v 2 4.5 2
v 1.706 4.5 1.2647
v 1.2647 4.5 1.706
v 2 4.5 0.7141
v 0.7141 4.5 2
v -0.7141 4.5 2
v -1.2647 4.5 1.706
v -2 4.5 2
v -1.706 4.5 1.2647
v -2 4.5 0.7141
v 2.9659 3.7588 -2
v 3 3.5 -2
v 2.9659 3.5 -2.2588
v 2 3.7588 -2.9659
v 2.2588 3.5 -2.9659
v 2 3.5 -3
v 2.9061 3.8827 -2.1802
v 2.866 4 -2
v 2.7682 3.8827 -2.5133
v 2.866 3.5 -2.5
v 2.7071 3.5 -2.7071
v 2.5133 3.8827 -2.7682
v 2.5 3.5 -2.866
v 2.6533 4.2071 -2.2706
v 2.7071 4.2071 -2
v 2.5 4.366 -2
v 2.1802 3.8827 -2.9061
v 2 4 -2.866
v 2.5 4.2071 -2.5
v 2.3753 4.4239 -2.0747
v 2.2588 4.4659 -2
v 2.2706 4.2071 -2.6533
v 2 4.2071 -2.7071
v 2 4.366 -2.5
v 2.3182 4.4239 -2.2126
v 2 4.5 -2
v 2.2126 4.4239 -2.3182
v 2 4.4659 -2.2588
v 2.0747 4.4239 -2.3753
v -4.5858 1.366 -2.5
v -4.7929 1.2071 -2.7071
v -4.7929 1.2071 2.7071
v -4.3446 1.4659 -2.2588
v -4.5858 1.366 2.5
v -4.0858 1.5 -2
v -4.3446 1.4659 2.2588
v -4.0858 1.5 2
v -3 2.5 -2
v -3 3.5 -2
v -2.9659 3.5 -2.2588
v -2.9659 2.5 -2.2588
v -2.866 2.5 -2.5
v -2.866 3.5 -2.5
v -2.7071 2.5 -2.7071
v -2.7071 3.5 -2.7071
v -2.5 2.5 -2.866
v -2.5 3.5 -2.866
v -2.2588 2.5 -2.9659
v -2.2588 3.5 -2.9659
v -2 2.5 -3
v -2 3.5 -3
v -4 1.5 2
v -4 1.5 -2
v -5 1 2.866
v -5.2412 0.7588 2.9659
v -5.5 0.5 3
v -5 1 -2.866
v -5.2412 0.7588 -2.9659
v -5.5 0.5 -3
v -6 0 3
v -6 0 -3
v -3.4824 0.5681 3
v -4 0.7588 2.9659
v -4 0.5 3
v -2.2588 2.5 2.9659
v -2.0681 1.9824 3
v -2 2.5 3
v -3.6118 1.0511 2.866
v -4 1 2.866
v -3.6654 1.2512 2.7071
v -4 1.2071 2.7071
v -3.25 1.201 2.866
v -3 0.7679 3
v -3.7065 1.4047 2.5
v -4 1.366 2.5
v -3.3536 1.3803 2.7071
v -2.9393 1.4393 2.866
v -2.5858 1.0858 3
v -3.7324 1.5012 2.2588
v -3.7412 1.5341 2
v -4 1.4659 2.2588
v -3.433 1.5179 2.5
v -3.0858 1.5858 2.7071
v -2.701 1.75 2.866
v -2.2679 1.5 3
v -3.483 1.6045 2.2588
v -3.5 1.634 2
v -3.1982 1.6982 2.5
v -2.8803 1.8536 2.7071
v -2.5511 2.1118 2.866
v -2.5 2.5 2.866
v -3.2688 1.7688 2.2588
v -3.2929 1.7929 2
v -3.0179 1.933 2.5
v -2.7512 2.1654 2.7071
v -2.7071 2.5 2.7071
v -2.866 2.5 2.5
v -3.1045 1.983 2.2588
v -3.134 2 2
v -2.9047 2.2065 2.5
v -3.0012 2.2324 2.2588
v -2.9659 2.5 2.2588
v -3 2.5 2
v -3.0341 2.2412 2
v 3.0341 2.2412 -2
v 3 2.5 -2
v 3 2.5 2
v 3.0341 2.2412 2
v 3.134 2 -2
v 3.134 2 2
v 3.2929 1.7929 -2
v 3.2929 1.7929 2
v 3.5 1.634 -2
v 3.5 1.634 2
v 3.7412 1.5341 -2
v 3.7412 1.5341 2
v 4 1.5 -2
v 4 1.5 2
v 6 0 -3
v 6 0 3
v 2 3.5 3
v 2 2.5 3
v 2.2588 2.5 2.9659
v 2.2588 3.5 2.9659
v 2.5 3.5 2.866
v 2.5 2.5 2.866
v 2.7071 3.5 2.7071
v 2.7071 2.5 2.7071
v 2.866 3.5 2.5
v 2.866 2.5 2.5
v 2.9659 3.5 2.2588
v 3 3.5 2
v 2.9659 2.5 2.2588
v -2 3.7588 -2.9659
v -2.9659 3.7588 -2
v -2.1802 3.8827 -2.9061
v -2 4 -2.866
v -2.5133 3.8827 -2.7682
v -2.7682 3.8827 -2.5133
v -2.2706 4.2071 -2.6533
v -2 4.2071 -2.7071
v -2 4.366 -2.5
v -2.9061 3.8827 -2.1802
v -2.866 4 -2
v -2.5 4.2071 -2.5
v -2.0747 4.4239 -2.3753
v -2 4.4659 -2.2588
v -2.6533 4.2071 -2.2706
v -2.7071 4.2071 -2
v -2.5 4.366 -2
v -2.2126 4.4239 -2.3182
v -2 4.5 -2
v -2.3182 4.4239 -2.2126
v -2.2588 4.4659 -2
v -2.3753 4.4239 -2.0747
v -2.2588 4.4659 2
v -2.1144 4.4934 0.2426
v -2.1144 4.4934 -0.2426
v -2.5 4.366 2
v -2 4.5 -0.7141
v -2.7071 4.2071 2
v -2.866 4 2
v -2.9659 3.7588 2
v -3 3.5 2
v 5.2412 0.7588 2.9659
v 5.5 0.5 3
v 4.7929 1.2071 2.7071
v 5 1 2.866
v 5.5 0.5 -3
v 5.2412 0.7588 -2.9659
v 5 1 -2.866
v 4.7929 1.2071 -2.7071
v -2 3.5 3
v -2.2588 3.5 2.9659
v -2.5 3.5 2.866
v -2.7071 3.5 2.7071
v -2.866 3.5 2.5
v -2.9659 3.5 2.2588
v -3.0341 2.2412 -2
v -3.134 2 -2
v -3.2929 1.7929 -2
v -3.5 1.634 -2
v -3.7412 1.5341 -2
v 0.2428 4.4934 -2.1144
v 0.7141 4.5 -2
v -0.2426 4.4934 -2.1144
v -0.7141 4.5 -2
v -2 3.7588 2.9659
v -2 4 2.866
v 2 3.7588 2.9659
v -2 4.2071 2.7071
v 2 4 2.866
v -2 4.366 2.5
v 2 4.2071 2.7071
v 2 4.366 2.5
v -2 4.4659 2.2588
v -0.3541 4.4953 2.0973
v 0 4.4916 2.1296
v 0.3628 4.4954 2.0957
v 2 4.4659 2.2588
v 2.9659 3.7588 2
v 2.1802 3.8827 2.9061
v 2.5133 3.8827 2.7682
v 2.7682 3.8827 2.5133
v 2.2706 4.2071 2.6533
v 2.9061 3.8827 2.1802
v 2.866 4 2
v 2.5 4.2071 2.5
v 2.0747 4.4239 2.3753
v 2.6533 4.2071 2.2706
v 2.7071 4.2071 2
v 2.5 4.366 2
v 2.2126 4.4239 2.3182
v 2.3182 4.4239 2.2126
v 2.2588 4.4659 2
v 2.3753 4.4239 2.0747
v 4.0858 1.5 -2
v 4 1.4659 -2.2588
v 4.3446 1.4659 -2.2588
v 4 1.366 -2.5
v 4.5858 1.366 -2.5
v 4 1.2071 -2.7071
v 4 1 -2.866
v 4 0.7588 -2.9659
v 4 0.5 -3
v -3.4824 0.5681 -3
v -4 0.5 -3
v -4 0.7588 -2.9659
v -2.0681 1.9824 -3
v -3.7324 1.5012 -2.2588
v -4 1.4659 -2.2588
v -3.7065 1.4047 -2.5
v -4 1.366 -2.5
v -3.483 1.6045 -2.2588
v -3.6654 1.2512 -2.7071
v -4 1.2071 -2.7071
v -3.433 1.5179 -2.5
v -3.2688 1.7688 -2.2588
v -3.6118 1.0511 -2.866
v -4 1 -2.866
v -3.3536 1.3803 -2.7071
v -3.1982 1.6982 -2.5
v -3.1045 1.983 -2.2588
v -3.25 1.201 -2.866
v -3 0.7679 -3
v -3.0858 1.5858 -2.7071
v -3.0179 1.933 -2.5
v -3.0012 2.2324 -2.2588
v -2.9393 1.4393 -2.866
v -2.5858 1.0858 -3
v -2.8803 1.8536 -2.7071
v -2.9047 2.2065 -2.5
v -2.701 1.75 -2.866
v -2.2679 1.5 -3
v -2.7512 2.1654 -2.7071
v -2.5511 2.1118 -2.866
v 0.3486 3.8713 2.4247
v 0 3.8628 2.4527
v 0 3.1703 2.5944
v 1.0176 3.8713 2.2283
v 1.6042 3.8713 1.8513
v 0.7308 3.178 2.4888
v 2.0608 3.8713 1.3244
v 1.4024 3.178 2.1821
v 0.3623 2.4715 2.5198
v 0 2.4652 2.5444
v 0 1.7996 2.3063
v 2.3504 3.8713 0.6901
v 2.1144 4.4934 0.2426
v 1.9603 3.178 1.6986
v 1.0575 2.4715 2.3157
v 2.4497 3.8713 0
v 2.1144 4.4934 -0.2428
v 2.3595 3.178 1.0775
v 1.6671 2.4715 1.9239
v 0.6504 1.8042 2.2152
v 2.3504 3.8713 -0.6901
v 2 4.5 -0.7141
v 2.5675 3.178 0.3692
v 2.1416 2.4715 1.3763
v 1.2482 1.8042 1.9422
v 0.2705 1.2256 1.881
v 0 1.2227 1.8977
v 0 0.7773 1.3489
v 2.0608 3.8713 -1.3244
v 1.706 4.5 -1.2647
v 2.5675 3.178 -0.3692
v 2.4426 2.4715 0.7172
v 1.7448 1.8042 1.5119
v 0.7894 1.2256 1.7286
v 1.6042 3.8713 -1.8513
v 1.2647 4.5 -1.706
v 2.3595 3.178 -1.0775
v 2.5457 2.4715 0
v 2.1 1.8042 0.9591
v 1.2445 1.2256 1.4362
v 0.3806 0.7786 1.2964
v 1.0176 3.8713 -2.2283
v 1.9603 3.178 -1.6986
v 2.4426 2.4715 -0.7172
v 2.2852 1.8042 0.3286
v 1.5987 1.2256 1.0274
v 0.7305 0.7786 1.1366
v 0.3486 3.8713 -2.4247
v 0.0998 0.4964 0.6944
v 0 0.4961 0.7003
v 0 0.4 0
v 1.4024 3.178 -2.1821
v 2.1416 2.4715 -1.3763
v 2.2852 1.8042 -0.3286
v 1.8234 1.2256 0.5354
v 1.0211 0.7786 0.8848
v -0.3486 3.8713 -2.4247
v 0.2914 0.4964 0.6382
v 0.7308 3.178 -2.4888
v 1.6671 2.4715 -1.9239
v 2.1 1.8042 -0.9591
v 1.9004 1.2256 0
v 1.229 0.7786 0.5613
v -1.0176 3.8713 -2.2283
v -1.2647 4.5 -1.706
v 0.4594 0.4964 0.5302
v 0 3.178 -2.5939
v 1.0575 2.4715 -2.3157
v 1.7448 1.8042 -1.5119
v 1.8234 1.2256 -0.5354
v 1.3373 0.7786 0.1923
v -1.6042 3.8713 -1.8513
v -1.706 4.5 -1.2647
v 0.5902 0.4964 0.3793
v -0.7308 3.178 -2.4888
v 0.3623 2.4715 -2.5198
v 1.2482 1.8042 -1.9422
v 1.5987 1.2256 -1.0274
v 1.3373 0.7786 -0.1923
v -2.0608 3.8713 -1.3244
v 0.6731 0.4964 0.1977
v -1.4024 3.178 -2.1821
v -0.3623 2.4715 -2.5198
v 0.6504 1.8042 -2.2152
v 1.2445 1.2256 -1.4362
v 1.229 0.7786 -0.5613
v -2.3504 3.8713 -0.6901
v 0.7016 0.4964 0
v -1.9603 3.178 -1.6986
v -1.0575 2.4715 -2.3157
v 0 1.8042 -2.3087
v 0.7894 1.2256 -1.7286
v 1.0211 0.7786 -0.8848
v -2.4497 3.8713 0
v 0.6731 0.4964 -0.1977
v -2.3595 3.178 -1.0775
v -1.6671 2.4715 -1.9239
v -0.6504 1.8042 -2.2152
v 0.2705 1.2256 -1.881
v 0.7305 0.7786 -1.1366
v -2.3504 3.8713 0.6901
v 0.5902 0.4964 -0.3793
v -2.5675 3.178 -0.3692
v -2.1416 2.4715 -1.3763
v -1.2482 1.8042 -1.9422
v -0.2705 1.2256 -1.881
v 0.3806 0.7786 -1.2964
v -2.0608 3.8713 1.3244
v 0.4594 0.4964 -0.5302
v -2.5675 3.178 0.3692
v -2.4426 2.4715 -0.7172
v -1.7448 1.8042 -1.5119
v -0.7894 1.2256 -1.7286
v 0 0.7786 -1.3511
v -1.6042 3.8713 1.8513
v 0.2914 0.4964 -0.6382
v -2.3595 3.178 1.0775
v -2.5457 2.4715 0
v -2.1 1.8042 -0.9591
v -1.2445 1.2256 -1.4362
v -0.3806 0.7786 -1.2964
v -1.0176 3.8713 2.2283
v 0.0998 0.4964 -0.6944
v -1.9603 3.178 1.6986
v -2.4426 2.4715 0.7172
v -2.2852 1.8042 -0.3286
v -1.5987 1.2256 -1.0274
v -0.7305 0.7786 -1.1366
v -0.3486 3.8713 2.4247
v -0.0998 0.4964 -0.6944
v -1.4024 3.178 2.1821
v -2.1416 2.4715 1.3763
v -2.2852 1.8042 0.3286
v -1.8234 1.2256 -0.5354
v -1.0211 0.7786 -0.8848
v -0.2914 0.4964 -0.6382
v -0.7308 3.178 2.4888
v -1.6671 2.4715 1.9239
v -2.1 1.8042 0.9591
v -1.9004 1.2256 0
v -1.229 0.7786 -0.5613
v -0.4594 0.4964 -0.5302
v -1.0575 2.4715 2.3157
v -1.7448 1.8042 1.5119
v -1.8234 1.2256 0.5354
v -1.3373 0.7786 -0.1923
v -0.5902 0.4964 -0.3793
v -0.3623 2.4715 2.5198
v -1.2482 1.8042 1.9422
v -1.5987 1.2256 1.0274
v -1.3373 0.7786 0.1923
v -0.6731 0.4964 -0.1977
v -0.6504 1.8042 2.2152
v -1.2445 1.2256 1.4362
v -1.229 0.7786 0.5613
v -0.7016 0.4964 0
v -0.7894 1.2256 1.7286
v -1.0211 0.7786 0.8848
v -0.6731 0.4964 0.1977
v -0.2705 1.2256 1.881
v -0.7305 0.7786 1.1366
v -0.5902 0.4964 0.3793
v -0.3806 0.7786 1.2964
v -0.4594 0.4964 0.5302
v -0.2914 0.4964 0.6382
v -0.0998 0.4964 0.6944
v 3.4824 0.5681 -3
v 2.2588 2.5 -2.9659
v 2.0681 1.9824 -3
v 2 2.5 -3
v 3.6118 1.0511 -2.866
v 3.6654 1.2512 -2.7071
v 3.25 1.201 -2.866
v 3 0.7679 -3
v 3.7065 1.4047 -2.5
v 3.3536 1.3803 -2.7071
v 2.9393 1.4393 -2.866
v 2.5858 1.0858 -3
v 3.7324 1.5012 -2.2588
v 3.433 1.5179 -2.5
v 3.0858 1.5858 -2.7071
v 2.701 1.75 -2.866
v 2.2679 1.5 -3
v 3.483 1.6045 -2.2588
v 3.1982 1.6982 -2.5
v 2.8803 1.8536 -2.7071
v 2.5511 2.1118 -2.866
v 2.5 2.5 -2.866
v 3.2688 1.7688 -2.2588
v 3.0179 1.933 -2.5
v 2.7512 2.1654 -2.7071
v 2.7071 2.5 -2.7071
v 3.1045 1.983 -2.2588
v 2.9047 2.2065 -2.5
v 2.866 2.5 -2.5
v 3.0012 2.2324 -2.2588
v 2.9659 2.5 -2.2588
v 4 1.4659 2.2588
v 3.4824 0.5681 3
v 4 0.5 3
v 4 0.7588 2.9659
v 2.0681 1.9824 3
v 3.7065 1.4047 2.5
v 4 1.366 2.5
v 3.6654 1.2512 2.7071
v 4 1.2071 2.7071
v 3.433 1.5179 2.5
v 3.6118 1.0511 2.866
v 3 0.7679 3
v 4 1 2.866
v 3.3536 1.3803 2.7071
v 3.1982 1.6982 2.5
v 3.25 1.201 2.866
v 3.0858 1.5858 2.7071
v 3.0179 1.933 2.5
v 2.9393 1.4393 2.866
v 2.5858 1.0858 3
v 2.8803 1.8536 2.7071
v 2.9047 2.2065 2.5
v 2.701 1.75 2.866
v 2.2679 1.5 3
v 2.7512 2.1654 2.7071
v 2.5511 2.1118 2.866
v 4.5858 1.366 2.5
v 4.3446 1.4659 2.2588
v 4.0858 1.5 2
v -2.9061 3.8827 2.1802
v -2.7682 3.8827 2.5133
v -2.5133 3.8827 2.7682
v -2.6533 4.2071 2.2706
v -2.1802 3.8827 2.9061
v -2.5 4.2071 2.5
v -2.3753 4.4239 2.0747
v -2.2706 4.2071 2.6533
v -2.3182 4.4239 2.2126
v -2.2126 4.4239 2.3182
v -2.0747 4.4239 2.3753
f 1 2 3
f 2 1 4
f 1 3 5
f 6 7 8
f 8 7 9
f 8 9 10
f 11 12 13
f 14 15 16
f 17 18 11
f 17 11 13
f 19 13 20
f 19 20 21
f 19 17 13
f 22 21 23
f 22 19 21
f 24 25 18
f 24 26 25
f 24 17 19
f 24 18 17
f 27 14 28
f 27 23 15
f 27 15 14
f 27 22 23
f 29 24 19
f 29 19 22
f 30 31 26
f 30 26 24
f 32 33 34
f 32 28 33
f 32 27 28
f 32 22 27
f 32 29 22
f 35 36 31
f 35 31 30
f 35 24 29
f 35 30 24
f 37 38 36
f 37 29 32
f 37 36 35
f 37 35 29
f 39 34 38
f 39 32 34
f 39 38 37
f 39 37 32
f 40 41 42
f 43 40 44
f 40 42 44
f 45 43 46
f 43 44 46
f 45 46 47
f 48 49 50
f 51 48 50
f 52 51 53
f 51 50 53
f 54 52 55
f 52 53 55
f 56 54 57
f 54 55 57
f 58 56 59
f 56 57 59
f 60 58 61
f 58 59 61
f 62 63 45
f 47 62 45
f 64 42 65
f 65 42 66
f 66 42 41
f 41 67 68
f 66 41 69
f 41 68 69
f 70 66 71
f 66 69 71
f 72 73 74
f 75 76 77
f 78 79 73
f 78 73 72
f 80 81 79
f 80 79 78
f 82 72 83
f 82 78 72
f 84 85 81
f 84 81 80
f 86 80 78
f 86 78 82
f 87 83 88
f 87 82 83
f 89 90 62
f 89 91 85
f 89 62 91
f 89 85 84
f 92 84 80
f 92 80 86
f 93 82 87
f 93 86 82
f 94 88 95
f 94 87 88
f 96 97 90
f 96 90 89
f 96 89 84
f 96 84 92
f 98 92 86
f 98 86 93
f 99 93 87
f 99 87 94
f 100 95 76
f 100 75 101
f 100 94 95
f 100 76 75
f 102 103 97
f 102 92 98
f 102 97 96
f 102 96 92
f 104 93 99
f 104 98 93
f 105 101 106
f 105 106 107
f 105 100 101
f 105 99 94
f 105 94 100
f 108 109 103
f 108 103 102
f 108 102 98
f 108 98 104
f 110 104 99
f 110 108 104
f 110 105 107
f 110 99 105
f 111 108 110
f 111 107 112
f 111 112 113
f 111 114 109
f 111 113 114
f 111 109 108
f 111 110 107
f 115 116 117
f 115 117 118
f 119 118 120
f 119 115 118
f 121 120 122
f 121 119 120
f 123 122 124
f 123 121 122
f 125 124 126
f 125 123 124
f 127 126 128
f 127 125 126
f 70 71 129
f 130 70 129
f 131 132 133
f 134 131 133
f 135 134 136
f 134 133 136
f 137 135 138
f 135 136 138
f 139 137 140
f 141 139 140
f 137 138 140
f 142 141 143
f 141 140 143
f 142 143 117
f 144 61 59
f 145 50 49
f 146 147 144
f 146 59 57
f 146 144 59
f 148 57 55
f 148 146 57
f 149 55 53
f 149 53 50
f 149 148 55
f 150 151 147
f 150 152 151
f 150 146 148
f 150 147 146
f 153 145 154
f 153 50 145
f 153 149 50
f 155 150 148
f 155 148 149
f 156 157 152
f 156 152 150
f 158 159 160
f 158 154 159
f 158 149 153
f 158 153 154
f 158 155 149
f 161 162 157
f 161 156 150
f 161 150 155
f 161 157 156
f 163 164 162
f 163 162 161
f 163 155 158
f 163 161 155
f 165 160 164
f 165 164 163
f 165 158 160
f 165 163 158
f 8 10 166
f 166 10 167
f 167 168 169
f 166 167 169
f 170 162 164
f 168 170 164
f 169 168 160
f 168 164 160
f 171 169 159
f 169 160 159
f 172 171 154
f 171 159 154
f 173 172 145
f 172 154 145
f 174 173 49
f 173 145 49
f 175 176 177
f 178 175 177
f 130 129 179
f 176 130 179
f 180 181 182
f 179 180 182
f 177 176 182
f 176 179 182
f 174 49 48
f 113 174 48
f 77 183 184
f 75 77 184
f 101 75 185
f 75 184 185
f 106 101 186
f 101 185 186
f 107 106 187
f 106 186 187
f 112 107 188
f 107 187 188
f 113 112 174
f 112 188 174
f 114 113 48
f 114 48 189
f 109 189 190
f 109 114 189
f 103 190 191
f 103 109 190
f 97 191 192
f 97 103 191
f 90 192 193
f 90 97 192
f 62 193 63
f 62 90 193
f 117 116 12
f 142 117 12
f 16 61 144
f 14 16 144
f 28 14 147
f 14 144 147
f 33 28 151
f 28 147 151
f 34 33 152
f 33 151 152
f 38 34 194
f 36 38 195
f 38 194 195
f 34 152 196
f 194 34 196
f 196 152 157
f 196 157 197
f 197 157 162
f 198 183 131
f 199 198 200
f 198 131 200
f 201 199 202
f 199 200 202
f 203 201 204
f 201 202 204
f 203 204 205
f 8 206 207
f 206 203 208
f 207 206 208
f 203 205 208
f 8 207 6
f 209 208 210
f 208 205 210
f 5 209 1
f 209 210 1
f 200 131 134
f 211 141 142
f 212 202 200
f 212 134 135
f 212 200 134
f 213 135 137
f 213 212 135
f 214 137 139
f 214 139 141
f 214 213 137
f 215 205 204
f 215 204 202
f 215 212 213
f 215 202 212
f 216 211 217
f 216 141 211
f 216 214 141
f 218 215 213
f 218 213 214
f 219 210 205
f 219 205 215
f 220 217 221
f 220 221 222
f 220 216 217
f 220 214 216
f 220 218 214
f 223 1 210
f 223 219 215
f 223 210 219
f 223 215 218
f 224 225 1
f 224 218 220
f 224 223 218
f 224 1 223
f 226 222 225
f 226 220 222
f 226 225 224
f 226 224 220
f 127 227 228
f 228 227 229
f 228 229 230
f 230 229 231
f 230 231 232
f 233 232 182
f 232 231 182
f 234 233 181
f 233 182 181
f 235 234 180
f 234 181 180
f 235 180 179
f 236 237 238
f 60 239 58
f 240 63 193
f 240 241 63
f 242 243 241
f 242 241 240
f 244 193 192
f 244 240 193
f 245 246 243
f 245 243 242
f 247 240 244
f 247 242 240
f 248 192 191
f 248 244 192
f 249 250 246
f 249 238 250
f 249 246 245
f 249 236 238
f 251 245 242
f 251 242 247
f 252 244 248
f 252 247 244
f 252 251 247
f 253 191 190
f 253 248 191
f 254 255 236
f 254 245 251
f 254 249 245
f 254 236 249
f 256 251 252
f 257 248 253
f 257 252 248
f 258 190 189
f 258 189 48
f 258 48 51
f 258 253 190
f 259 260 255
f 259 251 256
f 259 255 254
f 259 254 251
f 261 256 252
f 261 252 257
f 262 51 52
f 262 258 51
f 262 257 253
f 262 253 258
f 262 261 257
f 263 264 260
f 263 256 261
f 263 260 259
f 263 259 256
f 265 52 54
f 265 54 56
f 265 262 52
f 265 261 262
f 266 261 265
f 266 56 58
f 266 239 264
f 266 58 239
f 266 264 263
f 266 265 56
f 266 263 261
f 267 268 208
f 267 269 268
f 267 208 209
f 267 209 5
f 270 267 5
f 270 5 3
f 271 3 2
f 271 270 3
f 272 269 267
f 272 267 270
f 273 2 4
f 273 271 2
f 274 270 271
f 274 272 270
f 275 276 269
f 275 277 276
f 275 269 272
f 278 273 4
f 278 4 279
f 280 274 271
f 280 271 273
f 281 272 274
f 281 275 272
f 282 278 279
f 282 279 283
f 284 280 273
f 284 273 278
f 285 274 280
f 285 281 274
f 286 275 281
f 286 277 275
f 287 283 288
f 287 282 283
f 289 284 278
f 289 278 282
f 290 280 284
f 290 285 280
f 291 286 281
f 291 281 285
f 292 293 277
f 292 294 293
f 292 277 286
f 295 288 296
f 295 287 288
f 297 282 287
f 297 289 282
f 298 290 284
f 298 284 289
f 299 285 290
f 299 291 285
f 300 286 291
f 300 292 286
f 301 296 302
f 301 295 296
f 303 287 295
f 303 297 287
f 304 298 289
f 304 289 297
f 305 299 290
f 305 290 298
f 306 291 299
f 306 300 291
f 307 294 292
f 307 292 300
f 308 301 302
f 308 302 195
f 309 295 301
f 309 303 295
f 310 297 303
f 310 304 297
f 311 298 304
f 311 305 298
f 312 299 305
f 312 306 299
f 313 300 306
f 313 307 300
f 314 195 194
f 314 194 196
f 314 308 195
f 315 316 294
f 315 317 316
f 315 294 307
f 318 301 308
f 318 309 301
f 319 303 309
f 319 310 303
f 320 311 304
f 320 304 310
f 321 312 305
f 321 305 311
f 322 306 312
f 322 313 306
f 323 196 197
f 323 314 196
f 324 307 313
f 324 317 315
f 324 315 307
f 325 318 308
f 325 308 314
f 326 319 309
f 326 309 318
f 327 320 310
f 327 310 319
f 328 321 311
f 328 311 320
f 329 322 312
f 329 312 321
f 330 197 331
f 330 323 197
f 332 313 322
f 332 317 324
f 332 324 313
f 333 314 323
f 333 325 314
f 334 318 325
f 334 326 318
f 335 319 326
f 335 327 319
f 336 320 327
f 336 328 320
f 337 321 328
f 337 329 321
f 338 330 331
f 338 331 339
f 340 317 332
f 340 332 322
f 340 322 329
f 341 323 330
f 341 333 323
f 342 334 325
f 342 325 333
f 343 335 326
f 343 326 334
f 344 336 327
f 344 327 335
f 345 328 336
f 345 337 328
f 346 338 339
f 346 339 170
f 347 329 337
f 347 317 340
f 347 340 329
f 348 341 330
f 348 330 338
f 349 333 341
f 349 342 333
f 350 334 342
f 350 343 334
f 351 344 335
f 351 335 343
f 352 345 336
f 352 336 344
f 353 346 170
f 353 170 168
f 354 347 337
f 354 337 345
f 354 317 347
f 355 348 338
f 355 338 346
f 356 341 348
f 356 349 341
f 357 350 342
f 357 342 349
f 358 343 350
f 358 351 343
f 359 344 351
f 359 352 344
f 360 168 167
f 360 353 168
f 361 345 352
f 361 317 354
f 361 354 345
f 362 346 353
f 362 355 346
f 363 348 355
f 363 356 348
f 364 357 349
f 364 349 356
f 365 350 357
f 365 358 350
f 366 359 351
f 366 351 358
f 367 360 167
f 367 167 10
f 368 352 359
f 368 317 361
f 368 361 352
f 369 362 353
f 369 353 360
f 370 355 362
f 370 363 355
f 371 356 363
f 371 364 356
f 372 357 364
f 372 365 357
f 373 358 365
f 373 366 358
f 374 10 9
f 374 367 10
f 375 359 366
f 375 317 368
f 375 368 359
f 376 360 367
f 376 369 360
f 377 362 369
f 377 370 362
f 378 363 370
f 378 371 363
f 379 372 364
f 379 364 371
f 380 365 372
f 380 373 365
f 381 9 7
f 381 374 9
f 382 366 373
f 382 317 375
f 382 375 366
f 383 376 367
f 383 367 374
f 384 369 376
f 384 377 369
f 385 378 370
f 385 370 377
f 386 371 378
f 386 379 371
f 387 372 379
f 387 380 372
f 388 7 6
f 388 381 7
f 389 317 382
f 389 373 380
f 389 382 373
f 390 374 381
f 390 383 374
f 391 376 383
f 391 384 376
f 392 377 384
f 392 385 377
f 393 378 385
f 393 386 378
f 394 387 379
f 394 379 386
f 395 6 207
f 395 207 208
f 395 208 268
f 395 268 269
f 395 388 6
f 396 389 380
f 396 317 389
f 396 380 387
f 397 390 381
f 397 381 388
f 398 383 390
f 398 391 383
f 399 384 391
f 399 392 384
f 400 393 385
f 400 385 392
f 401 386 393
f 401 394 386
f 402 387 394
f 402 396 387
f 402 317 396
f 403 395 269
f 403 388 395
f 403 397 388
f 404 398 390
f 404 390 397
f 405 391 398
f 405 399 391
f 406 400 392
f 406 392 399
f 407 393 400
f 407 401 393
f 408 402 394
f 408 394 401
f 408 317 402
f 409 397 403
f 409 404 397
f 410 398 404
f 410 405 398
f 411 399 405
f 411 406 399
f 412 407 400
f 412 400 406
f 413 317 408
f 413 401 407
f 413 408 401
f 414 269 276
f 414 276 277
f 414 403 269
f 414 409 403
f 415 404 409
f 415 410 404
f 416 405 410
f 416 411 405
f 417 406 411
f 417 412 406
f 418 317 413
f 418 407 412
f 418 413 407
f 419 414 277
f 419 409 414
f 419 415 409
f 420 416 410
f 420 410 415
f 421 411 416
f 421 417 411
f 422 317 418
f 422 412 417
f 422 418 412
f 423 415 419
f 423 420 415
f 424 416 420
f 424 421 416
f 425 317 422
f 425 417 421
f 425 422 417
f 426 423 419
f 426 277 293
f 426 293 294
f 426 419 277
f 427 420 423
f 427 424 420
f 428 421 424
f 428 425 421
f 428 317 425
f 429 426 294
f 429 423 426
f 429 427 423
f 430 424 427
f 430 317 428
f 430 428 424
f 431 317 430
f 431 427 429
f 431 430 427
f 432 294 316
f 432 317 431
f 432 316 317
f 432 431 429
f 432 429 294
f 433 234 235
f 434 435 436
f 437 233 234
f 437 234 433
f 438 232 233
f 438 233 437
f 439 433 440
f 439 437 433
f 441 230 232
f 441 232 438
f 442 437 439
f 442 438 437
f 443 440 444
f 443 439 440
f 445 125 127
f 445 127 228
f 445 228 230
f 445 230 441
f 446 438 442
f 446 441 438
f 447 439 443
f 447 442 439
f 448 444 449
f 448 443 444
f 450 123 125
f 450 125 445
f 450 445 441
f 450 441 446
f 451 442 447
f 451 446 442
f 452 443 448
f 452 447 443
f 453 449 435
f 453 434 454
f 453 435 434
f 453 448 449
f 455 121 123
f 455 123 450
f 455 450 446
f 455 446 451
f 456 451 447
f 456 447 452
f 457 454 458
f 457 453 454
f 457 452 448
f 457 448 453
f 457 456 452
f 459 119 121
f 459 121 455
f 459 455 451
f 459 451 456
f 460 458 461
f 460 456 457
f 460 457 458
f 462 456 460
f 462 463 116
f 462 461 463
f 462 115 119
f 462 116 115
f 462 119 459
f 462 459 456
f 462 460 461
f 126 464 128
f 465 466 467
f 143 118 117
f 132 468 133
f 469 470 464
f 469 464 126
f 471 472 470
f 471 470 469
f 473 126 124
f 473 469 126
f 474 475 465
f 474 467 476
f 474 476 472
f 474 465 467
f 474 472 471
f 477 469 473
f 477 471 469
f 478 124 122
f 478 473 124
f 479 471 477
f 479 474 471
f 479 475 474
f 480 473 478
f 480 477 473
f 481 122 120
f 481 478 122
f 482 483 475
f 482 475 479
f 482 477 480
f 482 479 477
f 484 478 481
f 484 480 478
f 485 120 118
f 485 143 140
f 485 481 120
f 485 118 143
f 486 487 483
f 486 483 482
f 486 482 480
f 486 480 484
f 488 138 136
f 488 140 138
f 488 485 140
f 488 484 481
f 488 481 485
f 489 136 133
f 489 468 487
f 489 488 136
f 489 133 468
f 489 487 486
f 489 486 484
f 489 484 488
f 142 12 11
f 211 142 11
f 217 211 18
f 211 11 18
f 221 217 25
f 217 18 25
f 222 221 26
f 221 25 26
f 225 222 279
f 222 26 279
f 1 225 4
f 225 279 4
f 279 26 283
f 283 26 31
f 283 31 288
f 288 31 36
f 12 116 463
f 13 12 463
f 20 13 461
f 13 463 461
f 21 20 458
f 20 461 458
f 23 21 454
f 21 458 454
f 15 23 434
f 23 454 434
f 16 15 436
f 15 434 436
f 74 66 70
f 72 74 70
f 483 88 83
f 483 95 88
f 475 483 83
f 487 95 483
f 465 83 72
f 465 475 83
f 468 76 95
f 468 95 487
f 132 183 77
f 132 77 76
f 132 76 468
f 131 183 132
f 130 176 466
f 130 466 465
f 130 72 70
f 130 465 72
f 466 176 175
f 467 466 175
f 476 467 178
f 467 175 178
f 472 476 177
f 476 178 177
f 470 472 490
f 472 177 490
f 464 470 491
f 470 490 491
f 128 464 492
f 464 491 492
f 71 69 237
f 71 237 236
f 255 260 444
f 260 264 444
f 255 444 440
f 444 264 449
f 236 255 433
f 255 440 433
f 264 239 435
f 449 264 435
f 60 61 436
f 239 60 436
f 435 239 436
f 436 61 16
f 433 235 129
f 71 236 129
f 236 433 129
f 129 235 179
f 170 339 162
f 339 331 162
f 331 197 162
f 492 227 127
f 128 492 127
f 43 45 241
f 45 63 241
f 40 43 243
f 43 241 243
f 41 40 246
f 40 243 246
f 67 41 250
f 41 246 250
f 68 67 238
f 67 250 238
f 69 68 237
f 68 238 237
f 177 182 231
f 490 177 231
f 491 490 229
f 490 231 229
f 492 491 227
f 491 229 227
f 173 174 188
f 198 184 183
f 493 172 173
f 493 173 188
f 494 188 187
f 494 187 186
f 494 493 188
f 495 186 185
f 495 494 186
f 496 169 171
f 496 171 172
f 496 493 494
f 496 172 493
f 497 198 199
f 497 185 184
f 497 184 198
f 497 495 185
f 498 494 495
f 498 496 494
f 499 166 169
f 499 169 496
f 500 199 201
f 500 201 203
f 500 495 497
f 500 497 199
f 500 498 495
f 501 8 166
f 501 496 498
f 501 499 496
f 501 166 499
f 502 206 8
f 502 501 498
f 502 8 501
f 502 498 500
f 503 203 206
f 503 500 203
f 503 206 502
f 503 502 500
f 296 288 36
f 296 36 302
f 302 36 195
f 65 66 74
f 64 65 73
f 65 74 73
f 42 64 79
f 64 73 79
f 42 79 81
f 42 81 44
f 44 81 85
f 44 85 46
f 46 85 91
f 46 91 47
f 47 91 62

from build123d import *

# Parameters (mm, degrees)
BOSS_EXTRUDE1_DEPTH      = 3
BOSS_EXTRUDE1_DEPTH_BACK = 3
FILLET1_R                = 1


with BuildPart() as part:
    # Sketch1 → Boss-Extrude1 (new, two sides: drawn at the far end of the back side and taken through both)
    with BuildSketch(Plane.XY.offset(-BOSS_EXTRUDE1_DEPTH_BACK)):
        Polygon((-6, 0), (0, 0), (0, 4.5), (-3, 4.5), (-3, 1.5), (-4.5, 1.5), align=None)
        Polygon((0, 0), (6, 0), (4.5, 1.5), (3, 1.5), (3, 4.5), (0, 4.5), align=None)
    extrude(amount=BOSS_EXTRUDE1_DEPTH + BOSS_EXTRUDE1_DEPTH_BACK)

    # Sketch2 → Cut-Revolve1 (revolve, cut)
    with BuildSketch(Plane(origin=(0, 0, 0), x_dir=(0, 0, -1), z_dir=(1, 0, 0))):
        with BuildLine():
            Line((0, 0.4), (0, 5.6))
            ThreePointArc((0, 5.6), (-2.6, 3), (0, 0.4))
        make_face()
    revolve(axis=Axis((0, 0.4, 0), (0, 1, 0)), mode=Mode.SUBTRACT)

    # Fillet1
    # the kernel refuses this fillet: 1 mm, written as the material it adds along each edge
    with BuildSketch(Plane(origin=(-3, 1.5, 3), x_dir=(-1, 0, 0), z_dir=(0, 0, -1)), Plane(origin=(3, 1.5, -3), x_dir=(1, 0, 0), z_dir=(0, 0, 1))) as fillet1_piece_1:
        with BuildLine():
            CenterArc((FILLET1_R, FILLET1_R), FILLET1_R, 180, 90)
            Line((0, FILLET1_R), (0, 0))
            Line((0, 0), (FILLET1_R, 0))
        make_face()
    extrude(amount=6)
    # the kernel refuses this fillet: 1 mm, written as the material it takes off along each edge
    with BuildSketch(Plane(origin=(-2, 3.5, -2), x_dir=(-1, 0, 0), z_dir=(0, 1, 0))) as fillet1_2_piece_1_section:
        Polygon((0, 0), (FILLET1_R, 0), (FILLET1_R, -FILLET1_R), (0, -FILLET1_R), align=None)
    fillet1_2_piece_1 = extrude(amount=FILLET1_R, mode=Mode.PRIVATE)
    fillet1_2_piece_1 = fillet1_2_piece_1 - Plane(origin=(-2, 3.5, -2), x_dir=(0.7071067811865475, 0, 0.7071067811865475), z_dir=(0, 1, 0)) * Sphere(FILLET1_R, mode=Mode.PRIVATE)
    add(fillet1_2_piece_1, mode=Mode.SUBTRACT)
    with BuildSketch(Plane(origin=(-2, 3.5, 2), x_dir=(-1, 0, 0), z_dir=(0, 1, 0))) as fillet1_2_piece_2_section:
        Polygon((0, 0), (FILLET1_R, 0), (FILLET1_R, FILLET1_R), (0, FILLET1_R), align=None)
    fillet1_2_piece_2 = extrude(amount=FILLET1_R, mode=Mode.PRIVATE)
    fillet1_2_piece_2 = fillet1_2_piece_2 - Plane(origin=(-2, 3.5, 2), x_dir=(0.7071067811865475, 0, -0.7071067811865475), z_dir=(0, 1, 0)) * Sphere(FILLET1_R, mode=Mode.PRIVATE)
    add(fillet1_2_piece_2, mode=Mode.SUBTRACT)
    with BuildSketch(Plane(origin=(2, 3.5, -2), x_dir=(0, 0, -1), z_dir=(0, 1, 0))) as fillet1_2_piece_3_section:
        Polygon((0, 0), (FILLET1_R, 0), (FILLET1_R, -FILLET1_R), (0, -FILLET1_R), align=None)
    fillet1_2_piece_3 = extrude(amount=FILLET1_R, mode=Mode.PRIVATE)
    fillet1_2_piece_3 = fillet1_2_piece_3 - Plane(origin=(2, 3.5, -2), x_dir=(-0.7071067811865475, 0, 0.7071067811865475), z_dir=(0, 1, 0)) * Sphere(FILLET1_R, mode=Mode.PRIVATE)
    add(fillet1_2_piece_3, mode=Mode.SUBTRACT)
    with BuildSketch(Plane(origin=(2, 3.5, 2), x_dir=(0, 0, 1), z_dir=(0, 1, 0))) as fillet1_2_piece_4_section:
        Polygon((0, 0), (FILLET1_R, 0), (FILLET1_R, FILLET1_R), (0, FILLET1_R), align=None)
    fillet1_2_piece_4 = extrude(amount=FILLET1_R, mode=Mode.PRIVATE)
    fillet1_2_piece_4 = fillet1_2_piece_4 - Plane(origin=(2, 3.5, 2), x_dir=(-0.7071067811865475, 0, -0.7071067811865475), z_dir=(0, 1, 0)) * Sphere(FILLET1_R, mode=Mode.PRIVATE)
    add(fillet1_2_piece_4, mode=Mode.SUBTRACT)
    with BuildSketch(Plane(origin=(7, 1.5, -3), x_dir=(0, -1, 0), z_dir=(-1, 0, 0)), Plane(origin=(-4, 1.5, -3), x_dir=(0, -1, 0), z_dir=(-1, 0, 0))) as fillet1_2_piece_5:
        with BuildLine():
            CenterArc((FILLET1_R, FILLET1_R), FILLET1_R, 180, 90)
            Line((0, FILLET1_R), (0, 0))
            Line((0, 0), (FILLET1_R, 0))
        make_face()
    extrude(amount=3, mode=Mode.SUBTRACT)
    with BuildSketch(Plane(origin=(-4.5, 1.5, 4.035533906), x_dir=(-0.7071067811865516, -0.7071067811865435, 0), z_dir=(0, 0, -1)), Plane(origin=(4.5, 1.5, -4.035533906), x_dir=(0.707106781186551, -0.707106781186544, 0), z_dir=(0, 0, 1))) as fillet1_2_piece_6:
        with BuildLine():
            CenterArc((FILLET1_R * 0.414213562373, -FILLET1_R), FILLET1_R, 90, 45)
            Line((-FILLET1_R * 0.292893218813, -FILLET1_R * 0.292893218813), (0, 0))
            Line((0, 0), (FILLET1_R * 0.414213562373, 0))
        make_face()
    extrude(amount=8.071067812, mode=Mode.SUBTRACT)
    with BuildSketch(Plane(origin=(-3, 4.5, -2), x_dir=(1, 0, 0), z_dir=(0, 0, 1)), Plane(origin=(3, 4.5, -2), x_dir=(0, -1, 0), z_dir=(0, 0, 1)), Plane(origin=(-2, 4.5, -3), x_dir=(0, -1, 0), z_dir=(1, 0, 0)), Plane(origin=(2, 4.5, 3), x_dir=(0, -1, 0), z_dir=(-1, 0, 0))) as fillet1_2_piece_7:
        with BuildLine():
            CenterArc((FILLET1_R, -FILLET1_R), FILLET1_R, 90, 90)
            Line((0, -FILLET1_R), (0, 0))
            Line((0, 0), (FILLET1_R, 0))
        make_face()
    extrude(amount=4, mode=Mode.SUBTRACT)
    with BuildSketch(Plane(origin=(3, 2.5, -3), x_dir=(-1, 0, 0), z_dir=(0, 1, 0)), Plane(origin=(-3, 3.5, -3), x_dir=(1, 0, 0), z_dir=(0, -1, 0))) as fillet1_2_piece_8:
        with BuildLine():
            CenterArc((FILLET1_R, FILLET1_R), FILLET1_R, 180, 90)
            Line((0, FILLET1_R), (0, 0))
            Line((0, 0), (FILLET1_R, 0))
        make_face()
    extrude(amount=1, mode=Mode.SUBTRACT)
    with BuildSketch(Plane(origin=(-3, 3.5, 3), x_dir=(1, 0, 0), z_dir=(0, -1, 0)), Plane(origin=(3, 2.5, 3), x_dir=(-1, 0, 0), z_dir=(0, 1, 0))) as fillet1_2_piece_9:
        with BuildLine():
            CenterArc((FILLET1_R, -FILLET1_R), FILLET1_R, 90, 90)
            Line((0, -FILLET1_R), (0, 0))
            Line((0, 0), (FILLET1_R, 0))
        make_face()
    extrude(amount=1, mode=Mode.SUBTRACT)
    with BuildSketch(Plane(origin=(-4, 1.5, 3), x_dir=(0, -1, 0), z_dir=(-1, 0, 0)), Plane(origin=(7, 1.5, 3), x_dir=(0, -1, 0), z_dir=(-1, 0, 0))) as fillet1_2_piece_10:
        with BuildLine():
            CenterArc((FILLET1_R, -FILLET1_R), FILLET1_R, 90, 90)
            Line((0, -FILLET1_R), (0, 0))
            Line((0, 0), (FILLET1_R, 0))
        make_face()
    extrude(amount=3, mode=Mode.SUBTRACT)
    with BuildSketch(Plane(origin=(-4, 2.5, -3), x_dir=(0, -1, 0), z_dir=(-1, 0, 0))) as fillet1_2_piece_11:
        with BuildLine():
            CenterArc((1 + FILLET1_R, FILLET1_R), FILLET1_R, 180, 90)
            Line((1, FILLET1_R), (1, 0))
            Line((1, 0), (1 + FILLET1_R, 0))
        make_face()
    revolve(axis=Axis((-4, 2.5, -3), (0, 0, 1)), revolution_arc=90, mode=Mode.SUBTRACT)
    with BuildSketch(Plane(origin=(4, 2.5, 3), x_dir=(0, -1, 0), z_dir=(1, 0, 0))) as fillet1_2_piece_12:
        with BuildLine():
            CenterArc((1 + FILLET1_R, FILLET1_R), FILLET1_R, 180, 90)
            Line((1, FILLET1_R), (1, 0))
            Line((1, 0), (1 + FILLET1_R, 0))
        make_face()
    revolve(axis=Axis((4, 2.5, 3), (0, 0, -1)), revolution_arc=90, mode=Mode.SUBTRACT)
    with BuildSketch(Plane(origin=(-4, 2.5, 3), x_dir=(0, -1, 0), z_dir=(-1, 0, 0))) as fillet1_2_piece_13:
        with BuildLine():
            CenterArc((1 + FILLET1_R, -FILLET1_R), FILLET1_R, 90, 90)
            Line((1, -FILLET1_R), (1, 0))
            Line((1, 0), (1 + FILLET1_R, 0))
        make_face()
    revolve(axis=Axis((-4, 2.5, 3), (0, 0, 1)), revolution_arc=90, mode=Mode.SUBTRACT)
    with BuildSketch(Plane(origin=(4, 2.5, -3), x_dir=(0, -1, 0), z_dir=(1, 0, 0))) as fillet1_2_piece_14:
        with BuildLine():
            CenterArc((1 + FILLET1_R, -FILLET1_R), FILLET1_R, 90, 90)
            Line((1, -FILLET1_R), (1, 0))
            Line((1, 0), (1 + FILLET1_R, 0))
        make_face()
    revolve(axis=Axis((4, 2.5, -3), (0, 0, -1)), revolution_arc=90, mode=Mode.SUBTRACT)


solid = part.part
